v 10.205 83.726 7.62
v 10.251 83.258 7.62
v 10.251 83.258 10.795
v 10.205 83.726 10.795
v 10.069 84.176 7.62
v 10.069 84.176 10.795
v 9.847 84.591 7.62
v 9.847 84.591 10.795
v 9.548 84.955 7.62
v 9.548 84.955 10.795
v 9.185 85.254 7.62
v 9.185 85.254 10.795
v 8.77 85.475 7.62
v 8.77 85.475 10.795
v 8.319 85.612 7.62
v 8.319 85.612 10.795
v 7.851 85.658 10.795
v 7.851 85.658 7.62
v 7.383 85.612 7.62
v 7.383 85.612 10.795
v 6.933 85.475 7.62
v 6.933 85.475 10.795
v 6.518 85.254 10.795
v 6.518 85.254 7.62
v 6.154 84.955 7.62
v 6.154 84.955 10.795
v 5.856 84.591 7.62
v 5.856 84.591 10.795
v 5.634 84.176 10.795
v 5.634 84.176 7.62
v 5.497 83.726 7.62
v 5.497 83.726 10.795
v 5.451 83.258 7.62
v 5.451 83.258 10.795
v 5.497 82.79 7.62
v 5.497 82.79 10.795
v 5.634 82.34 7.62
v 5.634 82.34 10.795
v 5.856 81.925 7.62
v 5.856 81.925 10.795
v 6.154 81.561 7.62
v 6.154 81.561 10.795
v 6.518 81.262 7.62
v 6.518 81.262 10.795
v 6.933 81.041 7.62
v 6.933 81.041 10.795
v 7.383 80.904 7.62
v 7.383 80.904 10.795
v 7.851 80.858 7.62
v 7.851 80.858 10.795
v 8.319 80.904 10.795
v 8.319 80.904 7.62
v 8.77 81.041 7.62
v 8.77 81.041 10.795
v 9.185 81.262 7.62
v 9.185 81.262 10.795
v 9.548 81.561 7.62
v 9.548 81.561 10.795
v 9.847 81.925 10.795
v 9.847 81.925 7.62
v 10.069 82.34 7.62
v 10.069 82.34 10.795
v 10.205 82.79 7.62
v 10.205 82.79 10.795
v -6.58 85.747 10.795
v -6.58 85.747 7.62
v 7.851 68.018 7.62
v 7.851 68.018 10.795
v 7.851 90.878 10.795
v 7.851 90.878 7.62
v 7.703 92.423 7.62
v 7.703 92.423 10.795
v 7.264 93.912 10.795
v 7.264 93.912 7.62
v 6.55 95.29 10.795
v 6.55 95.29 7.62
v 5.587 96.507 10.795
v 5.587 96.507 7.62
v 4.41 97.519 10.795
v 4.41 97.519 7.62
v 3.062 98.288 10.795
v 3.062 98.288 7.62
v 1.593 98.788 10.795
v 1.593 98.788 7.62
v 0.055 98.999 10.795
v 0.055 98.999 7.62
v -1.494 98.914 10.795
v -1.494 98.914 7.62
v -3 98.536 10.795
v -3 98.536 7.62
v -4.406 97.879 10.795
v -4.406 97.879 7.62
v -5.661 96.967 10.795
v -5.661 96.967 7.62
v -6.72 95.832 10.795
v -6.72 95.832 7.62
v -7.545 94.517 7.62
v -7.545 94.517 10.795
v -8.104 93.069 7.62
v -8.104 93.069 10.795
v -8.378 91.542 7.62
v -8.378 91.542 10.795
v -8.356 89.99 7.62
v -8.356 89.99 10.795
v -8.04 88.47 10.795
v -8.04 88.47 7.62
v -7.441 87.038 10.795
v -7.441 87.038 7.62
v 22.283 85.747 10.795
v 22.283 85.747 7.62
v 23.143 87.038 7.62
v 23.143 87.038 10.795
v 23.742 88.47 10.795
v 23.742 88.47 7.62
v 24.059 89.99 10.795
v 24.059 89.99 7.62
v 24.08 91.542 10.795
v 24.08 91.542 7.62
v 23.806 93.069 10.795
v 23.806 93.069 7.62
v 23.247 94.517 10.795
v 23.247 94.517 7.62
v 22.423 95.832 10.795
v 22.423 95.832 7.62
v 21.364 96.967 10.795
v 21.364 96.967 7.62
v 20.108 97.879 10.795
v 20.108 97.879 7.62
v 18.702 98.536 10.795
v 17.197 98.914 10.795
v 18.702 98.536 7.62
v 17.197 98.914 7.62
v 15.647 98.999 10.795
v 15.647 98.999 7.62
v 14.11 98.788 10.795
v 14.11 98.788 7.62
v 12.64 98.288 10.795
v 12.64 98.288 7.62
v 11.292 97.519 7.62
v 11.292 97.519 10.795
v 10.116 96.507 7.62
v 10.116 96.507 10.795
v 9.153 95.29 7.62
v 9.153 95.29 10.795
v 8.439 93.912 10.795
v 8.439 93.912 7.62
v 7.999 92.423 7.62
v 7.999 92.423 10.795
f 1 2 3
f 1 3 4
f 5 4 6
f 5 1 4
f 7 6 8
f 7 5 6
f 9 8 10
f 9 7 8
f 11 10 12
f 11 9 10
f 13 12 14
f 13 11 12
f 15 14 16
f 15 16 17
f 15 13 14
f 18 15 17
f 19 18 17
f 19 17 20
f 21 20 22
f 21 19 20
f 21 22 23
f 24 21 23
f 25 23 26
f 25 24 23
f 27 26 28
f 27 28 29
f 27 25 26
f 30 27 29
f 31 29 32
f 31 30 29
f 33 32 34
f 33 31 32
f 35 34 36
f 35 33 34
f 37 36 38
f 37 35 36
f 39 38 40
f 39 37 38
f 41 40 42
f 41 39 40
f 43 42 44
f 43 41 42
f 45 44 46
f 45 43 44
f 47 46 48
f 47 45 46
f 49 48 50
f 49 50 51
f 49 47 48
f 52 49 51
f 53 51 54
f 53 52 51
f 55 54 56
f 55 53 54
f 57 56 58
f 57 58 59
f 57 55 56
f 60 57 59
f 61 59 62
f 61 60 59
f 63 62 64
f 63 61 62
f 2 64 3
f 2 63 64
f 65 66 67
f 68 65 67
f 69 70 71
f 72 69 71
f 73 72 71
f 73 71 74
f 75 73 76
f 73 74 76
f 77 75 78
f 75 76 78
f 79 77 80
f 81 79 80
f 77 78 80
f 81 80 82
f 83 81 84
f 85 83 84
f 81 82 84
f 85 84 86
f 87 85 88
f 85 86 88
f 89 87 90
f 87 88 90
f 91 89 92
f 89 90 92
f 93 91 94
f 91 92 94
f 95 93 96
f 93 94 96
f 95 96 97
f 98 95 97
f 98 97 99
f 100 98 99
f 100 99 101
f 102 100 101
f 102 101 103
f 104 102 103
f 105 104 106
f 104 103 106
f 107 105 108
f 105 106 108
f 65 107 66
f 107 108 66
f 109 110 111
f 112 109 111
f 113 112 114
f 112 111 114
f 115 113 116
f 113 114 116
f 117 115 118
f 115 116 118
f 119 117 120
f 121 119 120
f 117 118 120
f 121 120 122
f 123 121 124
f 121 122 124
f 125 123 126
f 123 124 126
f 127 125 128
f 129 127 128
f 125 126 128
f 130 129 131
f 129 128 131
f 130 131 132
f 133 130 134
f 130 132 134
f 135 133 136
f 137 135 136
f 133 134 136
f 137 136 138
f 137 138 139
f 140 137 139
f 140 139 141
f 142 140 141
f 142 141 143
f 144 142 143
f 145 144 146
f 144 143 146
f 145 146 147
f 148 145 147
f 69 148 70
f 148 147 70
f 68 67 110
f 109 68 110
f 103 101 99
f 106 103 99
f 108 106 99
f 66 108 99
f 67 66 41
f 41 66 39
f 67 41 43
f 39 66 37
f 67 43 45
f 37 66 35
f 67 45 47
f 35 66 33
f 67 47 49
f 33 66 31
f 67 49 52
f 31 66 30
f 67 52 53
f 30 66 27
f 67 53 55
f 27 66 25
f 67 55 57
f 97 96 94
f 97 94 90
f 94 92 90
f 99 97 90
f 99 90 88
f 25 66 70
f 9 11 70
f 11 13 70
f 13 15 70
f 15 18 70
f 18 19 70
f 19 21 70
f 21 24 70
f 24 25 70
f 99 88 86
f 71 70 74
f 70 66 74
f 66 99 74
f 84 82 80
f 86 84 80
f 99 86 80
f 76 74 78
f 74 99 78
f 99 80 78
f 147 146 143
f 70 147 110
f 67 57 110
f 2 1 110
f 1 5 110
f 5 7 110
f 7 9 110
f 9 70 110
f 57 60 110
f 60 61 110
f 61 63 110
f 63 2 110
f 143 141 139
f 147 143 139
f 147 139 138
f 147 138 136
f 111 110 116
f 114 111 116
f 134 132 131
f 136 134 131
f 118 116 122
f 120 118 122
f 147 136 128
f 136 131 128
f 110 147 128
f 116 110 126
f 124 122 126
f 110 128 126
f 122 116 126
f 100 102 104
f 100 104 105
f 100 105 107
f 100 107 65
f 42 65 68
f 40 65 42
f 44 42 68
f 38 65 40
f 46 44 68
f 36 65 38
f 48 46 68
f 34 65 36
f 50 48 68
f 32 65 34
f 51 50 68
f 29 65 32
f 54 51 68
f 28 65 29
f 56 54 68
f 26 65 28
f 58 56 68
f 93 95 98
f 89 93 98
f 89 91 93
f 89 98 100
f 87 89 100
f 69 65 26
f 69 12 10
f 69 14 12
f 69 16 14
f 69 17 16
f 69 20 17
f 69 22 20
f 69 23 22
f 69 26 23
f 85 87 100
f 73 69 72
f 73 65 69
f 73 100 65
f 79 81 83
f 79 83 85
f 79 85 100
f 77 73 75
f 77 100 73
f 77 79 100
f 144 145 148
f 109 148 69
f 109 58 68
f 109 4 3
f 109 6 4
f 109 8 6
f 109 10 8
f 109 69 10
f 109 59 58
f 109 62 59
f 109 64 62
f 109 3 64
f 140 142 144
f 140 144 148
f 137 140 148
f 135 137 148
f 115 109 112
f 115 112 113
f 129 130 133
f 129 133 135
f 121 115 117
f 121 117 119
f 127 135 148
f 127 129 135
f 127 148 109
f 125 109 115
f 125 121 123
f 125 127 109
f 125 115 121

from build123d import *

# Parameters (mm, degrees)
BOSS_EXTRUDE1_START = 7.62
SKETCH1_R           = 2.4
BOSS_EXTRUDE1_DEPTH = 3.175


with BuildPart() as part:
    # Sketch1 → Boss-Extrude1 (new body)
    with BuildSketch(Plane.XY.offset(BOSS_EXTRUDE1_START)):
        with BuildLine():
            Line((-6.580283468, 85.746774073), (7.851281635, 68.017997221))
            Line((7.851281635, 68.017997221), (22.282846738, 85.746774073))
            ThreePointArc((22.282846738, 85.746774073), (18.702240214, 98.536318224), (7.851281635, 90.877997221))
            ThreePointArc((7.851281635, 90.877997221), (-2.999676943, 98.536318224), (-6.580283468, 85.746774073))
        make_face()
        with Locations((7.851281635, 83.257997221)):
            Circle(SKETCH1_R, mode=Mode.SUBTRACT)
    extrude(amount=BOSS_EXTRUDE1_DEPTH)


solid = part.part
